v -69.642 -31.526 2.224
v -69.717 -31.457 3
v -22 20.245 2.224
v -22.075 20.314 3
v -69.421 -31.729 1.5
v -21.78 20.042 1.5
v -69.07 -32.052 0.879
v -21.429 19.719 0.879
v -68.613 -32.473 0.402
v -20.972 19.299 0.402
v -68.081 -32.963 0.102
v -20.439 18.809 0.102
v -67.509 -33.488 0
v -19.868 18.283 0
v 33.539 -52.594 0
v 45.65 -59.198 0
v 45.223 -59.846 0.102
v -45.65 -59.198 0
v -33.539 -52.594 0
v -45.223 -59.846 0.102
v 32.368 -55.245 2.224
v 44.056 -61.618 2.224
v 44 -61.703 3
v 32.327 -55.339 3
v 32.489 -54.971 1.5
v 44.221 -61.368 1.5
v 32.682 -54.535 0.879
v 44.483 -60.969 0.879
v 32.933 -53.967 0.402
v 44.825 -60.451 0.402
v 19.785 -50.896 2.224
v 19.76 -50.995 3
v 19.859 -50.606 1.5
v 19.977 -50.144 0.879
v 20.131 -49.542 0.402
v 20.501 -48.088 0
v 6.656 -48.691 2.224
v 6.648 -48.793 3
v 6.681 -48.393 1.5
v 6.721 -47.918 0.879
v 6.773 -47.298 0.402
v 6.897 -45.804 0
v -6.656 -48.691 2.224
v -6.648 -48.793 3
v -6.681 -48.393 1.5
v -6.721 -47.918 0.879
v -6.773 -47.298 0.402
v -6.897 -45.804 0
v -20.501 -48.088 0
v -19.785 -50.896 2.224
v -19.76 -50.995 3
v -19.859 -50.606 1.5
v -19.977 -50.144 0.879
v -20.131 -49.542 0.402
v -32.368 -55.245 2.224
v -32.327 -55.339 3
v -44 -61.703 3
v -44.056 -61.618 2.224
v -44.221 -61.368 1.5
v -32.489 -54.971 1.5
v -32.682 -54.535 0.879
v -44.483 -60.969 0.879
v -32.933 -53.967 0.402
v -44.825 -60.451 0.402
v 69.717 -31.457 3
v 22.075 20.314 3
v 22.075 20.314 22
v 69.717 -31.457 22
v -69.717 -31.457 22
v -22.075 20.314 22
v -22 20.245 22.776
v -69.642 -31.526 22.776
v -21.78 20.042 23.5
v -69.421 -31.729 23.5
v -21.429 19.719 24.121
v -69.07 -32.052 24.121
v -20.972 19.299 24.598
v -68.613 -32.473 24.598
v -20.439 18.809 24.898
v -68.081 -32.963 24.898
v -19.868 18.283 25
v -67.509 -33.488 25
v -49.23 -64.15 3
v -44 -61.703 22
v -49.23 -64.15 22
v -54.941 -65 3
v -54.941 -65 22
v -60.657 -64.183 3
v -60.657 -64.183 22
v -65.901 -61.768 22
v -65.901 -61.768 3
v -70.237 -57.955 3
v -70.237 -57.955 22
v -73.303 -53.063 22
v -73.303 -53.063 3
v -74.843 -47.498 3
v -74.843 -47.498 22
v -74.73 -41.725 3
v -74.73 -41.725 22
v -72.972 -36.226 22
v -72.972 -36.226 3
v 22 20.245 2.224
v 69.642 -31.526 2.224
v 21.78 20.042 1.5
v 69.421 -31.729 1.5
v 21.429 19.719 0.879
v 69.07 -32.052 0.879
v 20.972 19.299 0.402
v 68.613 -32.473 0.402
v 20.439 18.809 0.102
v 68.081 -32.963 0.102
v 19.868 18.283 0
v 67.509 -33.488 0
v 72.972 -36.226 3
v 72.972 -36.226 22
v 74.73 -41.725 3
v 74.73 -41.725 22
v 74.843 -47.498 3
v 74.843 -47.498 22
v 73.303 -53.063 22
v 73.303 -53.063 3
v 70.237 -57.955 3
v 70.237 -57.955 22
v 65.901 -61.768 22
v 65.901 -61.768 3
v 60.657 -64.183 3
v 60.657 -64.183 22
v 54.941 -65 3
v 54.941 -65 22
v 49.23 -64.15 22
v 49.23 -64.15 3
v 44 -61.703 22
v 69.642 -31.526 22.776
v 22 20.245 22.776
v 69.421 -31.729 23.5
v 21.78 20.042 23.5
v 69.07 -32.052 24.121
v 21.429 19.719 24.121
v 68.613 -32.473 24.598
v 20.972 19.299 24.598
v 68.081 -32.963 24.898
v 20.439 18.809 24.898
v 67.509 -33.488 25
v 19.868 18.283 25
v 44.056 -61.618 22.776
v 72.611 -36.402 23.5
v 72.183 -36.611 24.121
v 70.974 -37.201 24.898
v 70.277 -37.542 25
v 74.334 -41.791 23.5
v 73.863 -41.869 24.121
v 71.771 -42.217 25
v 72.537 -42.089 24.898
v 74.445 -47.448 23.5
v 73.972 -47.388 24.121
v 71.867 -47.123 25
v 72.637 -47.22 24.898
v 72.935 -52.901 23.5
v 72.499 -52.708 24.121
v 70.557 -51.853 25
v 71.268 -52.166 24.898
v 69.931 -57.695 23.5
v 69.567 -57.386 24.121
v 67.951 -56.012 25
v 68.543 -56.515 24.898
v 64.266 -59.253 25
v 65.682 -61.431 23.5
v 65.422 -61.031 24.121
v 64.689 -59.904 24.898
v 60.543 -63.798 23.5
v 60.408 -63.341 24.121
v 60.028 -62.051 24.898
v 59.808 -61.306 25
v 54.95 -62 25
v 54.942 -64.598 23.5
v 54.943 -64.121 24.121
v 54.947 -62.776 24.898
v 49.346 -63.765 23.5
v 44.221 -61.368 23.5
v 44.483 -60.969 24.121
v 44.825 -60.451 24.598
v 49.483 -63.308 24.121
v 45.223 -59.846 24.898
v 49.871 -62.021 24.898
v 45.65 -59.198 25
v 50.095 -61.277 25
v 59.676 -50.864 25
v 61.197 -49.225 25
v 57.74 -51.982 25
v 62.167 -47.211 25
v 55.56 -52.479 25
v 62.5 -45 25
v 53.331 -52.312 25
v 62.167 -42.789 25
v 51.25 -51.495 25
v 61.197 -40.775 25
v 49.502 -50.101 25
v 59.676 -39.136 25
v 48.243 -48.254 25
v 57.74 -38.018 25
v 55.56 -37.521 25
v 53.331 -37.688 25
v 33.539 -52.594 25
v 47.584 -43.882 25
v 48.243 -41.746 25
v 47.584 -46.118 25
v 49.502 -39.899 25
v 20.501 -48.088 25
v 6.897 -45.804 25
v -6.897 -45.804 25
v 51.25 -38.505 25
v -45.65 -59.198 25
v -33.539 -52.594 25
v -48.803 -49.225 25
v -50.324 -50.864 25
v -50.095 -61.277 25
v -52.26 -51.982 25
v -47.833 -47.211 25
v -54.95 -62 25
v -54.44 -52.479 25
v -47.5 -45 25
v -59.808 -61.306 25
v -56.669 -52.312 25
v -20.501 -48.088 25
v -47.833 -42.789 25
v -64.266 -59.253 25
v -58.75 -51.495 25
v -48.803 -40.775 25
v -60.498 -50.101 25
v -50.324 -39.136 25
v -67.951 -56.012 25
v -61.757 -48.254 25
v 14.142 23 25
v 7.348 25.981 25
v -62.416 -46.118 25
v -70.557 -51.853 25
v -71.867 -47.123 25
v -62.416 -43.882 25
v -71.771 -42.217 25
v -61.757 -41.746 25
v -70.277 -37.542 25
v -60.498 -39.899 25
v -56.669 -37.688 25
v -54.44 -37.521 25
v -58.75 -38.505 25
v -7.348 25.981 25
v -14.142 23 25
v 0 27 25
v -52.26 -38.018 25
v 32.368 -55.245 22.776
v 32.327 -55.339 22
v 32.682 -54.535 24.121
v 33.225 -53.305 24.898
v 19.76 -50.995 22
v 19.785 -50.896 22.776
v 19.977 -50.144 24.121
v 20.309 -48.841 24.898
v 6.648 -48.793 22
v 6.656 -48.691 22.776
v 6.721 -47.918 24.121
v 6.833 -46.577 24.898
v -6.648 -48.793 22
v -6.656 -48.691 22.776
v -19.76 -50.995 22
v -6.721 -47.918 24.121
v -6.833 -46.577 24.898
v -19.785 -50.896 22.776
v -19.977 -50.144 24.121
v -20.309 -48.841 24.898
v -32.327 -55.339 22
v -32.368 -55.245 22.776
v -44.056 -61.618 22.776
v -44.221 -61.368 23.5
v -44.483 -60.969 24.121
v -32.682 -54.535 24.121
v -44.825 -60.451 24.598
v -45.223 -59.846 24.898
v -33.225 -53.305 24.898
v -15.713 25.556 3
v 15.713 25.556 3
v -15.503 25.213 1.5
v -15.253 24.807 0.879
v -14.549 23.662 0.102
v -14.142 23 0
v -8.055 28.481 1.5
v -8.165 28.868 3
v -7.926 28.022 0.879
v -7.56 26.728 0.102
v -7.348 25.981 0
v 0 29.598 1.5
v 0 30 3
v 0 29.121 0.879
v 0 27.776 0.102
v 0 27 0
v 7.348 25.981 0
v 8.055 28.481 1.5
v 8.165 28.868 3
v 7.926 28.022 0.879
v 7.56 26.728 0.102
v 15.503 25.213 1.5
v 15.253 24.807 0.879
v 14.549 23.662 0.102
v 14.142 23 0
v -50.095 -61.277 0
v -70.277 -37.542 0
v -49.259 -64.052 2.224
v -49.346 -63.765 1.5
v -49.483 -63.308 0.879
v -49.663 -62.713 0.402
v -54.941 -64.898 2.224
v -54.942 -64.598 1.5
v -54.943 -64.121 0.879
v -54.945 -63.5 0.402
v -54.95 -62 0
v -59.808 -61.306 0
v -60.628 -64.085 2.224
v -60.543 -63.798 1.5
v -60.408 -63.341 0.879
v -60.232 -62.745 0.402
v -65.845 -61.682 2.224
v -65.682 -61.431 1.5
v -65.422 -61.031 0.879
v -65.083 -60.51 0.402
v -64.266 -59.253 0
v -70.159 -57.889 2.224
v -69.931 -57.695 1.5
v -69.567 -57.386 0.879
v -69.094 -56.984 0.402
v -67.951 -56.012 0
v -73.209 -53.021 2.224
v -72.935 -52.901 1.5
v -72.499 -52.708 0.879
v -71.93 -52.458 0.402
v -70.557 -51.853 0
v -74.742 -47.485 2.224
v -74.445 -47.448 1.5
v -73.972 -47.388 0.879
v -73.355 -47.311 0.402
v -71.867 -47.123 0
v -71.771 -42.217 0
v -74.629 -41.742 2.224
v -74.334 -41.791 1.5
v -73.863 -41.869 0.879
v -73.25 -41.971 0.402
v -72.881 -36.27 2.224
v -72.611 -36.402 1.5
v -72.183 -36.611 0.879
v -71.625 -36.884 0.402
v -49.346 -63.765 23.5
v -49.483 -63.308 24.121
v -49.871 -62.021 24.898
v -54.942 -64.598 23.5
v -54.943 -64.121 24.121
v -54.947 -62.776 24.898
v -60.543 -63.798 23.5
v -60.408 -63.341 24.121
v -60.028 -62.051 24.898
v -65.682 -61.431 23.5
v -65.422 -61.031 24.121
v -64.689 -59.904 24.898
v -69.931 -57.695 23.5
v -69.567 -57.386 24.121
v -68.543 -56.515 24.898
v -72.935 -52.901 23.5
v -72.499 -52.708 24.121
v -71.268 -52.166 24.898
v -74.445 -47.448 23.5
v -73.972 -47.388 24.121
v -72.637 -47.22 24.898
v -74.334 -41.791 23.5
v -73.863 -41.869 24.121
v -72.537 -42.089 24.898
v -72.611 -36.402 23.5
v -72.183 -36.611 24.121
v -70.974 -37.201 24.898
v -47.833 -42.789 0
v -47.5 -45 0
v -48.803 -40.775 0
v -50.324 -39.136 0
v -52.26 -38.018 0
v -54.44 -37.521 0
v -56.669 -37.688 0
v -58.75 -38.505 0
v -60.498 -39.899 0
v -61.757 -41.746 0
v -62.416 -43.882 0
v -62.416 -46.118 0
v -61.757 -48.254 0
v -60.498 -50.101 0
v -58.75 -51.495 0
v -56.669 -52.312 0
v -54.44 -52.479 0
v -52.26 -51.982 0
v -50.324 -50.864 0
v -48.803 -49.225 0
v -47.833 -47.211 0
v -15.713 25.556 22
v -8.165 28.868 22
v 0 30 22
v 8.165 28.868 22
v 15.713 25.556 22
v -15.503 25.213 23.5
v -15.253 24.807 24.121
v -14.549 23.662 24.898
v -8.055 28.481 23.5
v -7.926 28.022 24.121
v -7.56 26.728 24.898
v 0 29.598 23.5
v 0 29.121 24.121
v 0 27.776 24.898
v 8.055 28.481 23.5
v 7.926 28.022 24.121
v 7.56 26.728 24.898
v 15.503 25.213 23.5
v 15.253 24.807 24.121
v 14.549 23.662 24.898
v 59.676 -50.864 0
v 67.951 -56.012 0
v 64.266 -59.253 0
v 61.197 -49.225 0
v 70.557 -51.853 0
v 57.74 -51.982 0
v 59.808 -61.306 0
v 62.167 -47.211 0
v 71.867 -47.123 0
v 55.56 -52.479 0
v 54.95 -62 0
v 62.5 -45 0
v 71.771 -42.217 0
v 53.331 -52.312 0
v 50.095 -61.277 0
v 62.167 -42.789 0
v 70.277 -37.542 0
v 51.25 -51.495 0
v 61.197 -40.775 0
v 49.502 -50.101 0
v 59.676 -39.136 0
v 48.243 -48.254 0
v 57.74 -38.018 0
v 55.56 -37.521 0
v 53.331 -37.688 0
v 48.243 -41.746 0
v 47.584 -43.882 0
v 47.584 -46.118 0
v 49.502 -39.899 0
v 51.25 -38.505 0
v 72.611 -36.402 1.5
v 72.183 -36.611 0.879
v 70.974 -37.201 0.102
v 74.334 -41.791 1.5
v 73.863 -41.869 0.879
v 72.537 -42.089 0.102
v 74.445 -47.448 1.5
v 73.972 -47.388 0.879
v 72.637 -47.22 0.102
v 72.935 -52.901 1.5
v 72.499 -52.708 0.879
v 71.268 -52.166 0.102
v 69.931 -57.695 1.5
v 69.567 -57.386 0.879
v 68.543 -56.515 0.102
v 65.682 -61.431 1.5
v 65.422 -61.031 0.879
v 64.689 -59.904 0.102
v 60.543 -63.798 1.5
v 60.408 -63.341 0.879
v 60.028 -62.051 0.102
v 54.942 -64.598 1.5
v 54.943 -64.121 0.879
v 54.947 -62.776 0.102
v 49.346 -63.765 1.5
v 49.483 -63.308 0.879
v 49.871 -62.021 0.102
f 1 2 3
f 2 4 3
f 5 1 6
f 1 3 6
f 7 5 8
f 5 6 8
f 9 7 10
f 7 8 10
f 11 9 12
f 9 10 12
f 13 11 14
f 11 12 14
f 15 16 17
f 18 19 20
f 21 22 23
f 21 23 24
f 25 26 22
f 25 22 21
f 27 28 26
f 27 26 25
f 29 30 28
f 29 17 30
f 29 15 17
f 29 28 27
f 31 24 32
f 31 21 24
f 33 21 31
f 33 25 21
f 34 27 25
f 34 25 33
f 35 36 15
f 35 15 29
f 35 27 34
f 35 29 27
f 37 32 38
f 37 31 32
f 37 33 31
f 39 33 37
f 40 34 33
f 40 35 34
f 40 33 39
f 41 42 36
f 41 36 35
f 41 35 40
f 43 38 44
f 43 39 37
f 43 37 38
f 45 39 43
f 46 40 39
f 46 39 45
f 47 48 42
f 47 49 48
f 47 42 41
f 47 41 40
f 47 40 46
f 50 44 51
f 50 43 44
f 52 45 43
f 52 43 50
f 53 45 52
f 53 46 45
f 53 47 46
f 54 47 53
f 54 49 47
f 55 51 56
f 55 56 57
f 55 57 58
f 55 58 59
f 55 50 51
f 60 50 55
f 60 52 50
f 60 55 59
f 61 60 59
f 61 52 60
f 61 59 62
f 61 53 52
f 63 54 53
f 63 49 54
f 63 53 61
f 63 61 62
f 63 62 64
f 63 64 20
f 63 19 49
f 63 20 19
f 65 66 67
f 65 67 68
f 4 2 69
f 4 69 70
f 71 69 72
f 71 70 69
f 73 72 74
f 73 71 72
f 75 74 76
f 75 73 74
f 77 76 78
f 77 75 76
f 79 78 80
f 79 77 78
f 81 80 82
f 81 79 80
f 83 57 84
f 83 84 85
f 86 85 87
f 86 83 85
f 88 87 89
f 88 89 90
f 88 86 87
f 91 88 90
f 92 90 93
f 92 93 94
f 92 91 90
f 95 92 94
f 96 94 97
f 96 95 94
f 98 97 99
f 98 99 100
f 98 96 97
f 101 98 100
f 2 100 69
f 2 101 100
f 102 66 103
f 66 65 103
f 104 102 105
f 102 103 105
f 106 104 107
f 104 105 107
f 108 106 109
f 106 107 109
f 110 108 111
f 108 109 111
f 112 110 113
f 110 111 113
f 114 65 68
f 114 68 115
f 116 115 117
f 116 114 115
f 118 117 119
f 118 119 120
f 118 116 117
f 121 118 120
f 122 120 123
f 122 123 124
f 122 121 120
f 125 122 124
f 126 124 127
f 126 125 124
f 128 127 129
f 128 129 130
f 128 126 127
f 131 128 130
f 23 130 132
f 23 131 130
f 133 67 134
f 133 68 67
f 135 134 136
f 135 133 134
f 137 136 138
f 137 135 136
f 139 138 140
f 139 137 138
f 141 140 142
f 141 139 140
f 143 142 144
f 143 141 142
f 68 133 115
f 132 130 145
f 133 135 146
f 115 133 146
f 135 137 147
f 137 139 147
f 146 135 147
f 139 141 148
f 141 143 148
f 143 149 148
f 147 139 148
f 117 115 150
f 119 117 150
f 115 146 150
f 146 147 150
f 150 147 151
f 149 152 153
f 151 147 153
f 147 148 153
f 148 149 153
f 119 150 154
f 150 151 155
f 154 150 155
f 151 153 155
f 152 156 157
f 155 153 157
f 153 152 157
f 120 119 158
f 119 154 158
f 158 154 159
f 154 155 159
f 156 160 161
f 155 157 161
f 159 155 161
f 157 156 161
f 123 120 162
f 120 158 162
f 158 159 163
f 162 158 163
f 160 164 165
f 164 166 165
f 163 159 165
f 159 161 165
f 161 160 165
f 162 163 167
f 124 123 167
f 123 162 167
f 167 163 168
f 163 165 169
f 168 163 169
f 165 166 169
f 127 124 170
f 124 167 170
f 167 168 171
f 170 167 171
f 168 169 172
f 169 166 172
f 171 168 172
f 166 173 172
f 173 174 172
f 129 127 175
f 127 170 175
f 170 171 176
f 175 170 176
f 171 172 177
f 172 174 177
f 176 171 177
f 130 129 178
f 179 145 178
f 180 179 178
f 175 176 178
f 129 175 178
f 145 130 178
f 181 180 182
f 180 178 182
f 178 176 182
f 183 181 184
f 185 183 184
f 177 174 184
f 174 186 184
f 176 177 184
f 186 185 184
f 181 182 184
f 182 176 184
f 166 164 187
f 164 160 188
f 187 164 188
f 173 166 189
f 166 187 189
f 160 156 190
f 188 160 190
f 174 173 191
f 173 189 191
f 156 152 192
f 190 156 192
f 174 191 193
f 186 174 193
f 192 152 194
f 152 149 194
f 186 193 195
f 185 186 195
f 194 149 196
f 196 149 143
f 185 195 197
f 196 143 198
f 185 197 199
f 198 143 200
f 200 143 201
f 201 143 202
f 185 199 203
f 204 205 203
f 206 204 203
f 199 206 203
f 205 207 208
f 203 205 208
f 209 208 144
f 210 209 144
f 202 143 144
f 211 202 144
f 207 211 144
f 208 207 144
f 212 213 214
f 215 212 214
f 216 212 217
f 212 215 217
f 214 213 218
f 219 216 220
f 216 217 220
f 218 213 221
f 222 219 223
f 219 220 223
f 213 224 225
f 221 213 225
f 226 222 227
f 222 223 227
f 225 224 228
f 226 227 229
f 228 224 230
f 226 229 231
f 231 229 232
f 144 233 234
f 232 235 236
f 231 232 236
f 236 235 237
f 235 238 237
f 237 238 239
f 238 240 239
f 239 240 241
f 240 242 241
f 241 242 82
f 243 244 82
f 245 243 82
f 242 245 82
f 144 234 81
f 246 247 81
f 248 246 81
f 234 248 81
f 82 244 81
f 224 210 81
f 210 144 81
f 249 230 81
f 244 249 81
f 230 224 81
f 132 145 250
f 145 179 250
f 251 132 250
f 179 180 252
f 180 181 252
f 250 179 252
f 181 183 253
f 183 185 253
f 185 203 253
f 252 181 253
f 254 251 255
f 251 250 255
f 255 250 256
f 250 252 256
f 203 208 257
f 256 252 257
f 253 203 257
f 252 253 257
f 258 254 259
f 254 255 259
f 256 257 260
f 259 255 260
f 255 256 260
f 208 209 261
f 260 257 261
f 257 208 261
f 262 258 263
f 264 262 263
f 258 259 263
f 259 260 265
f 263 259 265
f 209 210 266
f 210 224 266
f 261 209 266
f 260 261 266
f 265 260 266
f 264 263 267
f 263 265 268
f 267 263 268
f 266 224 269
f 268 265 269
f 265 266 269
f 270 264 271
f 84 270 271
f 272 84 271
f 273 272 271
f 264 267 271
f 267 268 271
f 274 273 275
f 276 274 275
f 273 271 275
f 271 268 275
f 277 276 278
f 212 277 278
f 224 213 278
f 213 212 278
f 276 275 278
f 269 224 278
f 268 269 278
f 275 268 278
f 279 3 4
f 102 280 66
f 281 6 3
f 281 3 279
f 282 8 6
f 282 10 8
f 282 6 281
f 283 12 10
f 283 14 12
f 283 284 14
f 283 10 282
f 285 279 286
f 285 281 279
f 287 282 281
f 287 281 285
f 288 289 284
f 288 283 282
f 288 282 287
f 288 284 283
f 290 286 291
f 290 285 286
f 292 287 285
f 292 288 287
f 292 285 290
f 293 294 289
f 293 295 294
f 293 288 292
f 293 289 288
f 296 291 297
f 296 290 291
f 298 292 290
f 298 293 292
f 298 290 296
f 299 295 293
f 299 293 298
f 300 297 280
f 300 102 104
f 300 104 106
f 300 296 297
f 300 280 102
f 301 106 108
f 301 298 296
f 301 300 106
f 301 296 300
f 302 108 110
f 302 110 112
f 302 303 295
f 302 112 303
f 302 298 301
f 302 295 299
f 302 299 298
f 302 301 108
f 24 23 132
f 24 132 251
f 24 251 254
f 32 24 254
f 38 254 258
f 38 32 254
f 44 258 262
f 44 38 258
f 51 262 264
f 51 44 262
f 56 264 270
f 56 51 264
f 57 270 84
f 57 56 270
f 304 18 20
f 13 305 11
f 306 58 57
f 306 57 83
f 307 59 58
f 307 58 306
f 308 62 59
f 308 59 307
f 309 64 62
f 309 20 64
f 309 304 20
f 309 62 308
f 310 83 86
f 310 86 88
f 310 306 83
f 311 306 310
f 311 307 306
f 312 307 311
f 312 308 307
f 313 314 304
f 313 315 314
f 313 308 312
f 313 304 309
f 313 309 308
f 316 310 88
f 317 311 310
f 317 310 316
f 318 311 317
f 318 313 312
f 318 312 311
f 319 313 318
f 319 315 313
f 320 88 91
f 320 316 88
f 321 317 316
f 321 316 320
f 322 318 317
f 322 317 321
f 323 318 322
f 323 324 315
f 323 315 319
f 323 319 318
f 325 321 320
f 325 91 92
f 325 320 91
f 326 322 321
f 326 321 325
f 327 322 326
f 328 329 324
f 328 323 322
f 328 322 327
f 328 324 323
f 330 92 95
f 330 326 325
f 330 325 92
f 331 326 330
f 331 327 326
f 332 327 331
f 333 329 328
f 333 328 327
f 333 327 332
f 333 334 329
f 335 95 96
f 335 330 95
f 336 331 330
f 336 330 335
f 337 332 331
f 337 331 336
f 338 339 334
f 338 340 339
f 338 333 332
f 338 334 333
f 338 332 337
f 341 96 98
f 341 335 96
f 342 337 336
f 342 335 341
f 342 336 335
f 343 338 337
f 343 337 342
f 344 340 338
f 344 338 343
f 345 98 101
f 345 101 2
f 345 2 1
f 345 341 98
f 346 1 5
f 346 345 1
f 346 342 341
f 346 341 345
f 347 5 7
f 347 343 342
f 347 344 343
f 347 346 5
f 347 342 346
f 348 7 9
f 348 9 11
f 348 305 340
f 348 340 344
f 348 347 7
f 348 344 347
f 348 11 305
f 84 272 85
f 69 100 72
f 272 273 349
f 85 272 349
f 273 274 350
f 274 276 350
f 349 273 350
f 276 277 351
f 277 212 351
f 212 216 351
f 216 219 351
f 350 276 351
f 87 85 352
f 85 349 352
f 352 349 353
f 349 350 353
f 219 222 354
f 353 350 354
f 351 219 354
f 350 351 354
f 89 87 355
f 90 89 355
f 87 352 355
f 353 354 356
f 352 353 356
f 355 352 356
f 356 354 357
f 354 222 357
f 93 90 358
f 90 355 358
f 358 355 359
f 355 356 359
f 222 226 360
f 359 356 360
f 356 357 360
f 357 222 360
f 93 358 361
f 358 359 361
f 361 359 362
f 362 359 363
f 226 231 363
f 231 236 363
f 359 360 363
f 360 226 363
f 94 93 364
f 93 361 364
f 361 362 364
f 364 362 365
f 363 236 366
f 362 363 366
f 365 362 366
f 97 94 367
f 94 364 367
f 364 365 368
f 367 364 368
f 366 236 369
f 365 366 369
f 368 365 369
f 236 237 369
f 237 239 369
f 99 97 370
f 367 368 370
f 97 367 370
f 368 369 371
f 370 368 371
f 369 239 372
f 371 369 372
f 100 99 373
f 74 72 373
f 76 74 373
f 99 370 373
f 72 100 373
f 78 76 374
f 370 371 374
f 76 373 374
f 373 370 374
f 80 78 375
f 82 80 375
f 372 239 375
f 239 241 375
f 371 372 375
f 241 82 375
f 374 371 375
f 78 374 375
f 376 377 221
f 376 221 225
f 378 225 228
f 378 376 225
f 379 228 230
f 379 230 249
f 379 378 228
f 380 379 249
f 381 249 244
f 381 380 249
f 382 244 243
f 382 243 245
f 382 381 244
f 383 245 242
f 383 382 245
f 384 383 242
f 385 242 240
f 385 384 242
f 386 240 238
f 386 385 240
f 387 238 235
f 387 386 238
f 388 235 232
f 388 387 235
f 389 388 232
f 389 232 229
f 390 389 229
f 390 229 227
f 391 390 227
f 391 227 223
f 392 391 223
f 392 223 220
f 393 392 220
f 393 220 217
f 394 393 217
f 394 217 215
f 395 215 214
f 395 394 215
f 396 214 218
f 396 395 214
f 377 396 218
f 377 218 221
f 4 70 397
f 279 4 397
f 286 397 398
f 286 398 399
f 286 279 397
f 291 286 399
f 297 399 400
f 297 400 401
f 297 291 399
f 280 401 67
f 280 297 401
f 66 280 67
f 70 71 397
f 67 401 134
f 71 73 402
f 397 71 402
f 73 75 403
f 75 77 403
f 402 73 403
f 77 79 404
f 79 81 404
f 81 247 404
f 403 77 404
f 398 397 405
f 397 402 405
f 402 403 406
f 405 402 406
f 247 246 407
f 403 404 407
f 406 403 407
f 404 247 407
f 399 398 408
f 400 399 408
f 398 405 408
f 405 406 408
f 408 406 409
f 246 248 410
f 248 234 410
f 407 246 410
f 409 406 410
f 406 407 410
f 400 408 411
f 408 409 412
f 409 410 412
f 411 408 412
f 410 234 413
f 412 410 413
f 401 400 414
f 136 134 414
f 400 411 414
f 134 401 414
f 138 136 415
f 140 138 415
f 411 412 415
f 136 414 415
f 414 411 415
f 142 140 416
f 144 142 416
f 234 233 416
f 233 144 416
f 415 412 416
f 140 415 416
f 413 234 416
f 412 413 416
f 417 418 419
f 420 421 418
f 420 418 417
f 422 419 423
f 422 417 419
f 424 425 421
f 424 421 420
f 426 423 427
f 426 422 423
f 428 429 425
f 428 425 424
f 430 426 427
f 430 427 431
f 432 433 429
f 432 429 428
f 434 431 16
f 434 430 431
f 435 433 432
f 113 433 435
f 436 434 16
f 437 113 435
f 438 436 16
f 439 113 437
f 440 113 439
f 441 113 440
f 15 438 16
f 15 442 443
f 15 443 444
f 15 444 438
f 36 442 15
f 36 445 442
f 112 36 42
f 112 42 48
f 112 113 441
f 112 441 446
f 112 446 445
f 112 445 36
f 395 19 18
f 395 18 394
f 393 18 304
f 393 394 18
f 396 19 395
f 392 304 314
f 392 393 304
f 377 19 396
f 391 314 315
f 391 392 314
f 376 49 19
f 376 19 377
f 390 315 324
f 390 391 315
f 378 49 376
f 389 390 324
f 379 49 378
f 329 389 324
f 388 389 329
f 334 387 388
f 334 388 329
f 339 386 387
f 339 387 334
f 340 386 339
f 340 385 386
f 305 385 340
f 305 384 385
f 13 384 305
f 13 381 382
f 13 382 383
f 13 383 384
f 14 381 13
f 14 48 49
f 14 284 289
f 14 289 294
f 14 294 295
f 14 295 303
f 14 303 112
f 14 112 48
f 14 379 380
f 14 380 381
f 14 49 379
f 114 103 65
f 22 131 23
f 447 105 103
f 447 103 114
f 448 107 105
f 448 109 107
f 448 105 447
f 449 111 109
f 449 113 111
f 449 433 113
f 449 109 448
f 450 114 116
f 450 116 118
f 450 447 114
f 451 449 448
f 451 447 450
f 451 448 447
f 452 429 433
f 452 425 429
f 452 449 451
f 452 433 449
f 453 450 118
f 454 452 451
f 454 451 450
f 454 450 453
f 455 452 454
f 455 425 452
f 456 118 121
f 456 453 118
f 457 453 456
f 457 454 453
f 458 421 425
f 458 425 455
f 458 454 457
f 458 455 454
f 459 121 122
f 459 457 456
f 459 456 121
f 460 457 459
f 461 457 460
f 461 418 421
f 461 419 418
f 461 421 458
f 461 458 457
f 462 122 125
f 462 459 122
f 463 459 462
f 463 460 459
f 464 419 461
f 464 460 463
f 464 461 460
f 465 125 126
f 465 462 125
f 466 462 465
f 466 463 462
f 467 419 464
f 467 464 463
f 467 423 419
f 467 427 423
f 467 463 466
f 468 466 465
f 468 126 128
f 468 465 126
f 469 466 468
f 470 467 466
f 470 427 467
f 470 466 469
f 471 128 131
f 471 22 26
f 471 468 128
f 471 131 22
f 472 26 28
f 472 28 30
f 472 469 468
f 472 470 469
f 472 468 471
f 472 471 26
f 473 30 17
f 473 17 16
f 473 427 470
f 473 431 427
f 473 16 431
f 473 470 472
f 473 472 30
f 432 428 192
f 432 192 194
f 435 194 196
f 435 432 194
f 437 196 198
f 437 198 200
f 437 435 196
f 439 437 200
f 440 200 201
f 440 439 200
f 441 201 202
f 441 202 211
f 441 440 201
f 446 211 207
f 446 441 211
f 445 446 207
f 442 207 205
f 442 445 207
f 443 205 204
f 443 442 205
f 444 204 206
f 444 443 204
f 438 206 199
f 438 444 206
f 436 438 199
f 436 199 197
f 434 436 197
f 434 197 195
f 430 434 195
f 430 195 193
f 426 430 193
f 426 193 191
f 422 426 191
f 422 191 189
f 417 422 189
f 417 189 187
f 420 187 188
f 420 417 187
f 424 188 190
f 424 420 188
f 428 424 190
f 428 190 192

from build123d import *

# Parameters (mm, degrees)
SKETCH1_R           = 7.5
BOSS_EXTRUDE2_DEPTH = 25
FILLET2_R           = 3


with BuildPart() as part:
    # Sketch1 → Boss-Extrude2 (new body)
    with BuildSketch(Plane.XY):
        with BuildLine():
            Line((22.075429532, 20.314413872), (69.716953021, -31.457057418))
            ThreePointArc((69.716953021, -31.457057418), (70.236883802, -57.955206367), (44, -61.703293088))
            ThreePointArc((44, -61.703293088), (0, -48.516465442), (-44, -61.703293088))
            ThreePointArc((-44, -61.703293088), (-70.236883802, -57.955206367), (-69.716953021, -31.457057418))
            Line((-69.716953021, -31.457057418), (-22.075429532, 20.314413872))
            ThreePointArc((-22.075429532, 20.314413872), (0, 30), (22.075429532, 20.314413872))
        make_face()
        with Locations((55, -45)):
            Circle(SKETCH1_R, mode=Mode.SUBTRACT)
        with Locations((-55, -45)):
            Circle(SKETCH1_R, mode=Mode.SUBTRACT)
    extrude(amount=BOSS_EXTRUDE2_DEPTH)

    # Fillet2
    fillet2_edges = [part.edges().sort_by_distance(p)[0] for p in [
        (-70.236883802, -57.955206367, 25),
        (0, -48.516465442, 25),
        (70.236883802, -57.955206367, 25),
        (45.896191277, -5.571321773, 25),
        (0, 30, 25),
        (45.896191277, -5.571321773, 0),
        (70.236883802, -57.955206367, 0),
        (0, -48.516465442, 0),
        (-70.236883802, -57.955206367, 0),
        (-45.896191277, -5.571321773, 0),
        (0, 30, 0),
        (-45.896191277, -5.571321773, 25),
    ]]
    fillet(fillet2_edges, radius=FILLET2_R)


solid = part.part
